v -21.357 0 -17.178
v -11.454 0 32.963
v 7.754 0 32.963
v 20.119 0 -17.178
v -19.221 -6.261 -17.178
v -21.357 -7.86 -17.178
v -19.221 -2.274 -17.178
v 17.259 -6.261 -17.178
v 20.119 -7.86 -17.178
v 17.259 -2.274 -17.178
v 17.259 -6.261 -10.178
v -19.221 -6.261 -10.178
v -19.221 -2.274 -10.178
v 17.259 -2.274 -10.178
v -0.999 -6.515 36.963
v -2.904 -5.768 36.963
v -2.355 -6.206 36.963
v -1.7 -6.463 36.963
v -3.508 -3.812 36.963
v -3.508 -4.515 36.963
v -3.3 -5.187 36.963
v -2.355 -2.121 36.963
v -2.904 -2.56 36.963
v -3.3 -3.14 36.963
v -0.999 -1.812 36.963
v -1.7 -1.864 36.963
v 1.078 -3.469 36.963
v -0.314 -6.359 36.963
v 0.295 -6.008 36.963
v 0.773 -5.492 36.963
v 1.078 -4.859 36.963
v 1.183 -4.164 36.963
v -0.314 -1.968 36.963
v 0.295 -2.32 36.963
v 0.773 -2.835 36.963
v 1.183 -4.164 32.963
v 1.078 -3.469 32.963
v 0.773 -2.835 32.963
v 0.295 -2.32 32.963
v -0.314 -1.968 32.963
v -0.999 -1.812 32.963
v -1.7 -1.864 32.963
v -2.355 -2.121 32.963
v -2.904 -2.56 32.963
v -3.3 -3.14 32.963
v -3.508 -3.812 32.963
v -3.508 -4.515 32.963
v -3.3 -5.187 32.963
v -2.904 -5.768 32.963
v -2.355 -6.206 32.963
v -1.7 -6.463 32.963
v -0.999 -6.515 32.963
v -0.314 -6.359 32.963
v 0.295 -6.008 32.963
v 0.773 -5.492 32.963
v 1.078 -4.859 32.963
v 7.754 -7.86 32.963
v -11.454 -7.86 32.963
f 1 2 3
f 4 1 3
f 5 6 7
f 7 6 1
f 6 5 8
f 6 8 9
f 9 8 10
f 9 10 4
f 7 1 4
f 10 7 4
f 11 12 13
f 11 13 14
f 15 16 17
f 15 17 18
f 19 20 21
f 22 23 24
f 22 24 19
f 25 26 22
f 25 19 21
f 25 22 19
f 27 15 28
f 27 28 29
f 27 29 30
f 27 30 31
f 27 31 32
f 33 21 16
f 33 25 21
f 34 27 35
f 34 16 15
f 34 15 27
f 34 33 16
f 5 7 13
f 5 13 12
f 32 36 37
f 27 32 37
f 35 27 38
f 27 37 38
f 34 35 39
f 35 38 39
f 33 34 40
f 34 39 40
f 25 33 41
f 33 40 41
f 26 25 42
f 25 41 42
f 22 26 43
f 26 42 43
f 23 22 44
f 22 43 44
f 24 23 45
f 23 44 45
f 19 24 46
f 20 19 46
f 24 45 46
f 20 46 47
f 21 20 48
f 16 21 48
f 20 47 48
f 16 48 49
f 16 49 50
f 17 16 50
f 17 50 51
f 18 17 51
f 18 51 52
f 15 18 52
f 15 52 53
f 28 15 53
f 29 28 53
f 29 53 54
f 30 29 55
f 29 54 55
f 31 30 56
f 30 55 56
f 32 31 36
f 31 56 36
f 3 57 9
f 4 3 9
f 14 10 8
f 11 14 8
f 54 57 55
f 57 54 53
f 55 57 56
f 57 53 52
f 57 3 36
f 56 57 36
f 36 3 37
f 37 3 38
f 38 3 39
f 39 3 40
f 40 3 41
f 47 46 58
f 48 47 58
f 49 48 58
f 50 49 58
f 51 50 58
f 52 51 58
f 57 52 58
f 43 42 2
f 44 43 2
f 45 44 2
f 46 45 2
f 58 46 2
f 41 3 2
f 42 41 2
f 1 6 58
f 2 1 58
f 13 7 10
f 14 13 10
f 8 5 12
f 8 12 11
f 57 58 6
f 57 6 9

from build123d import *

# Parameters (mm, degrees)
F1_DEPTH = 7.86
F3_DEPTH = 25.4
F4_R     = 2.35837
F5_DEPTH = 4
F6_W     = 36.480802
F6_H     = 3.986974
F7_DEPTH = 7


with BuildPart() as f1:
    # F0 (on Front) → F1 (new body)
    with BuildSketch(Plane.XZ):
        Polygon((5.895124, 32.963499), (-8.975978, 32.963499), (-21.356635, -17.178163), (20.118568, -17.178163), align=None)
        Polygon((-8.975978, 32.963499), (-21.356635, 32.963499), (-21.356635, -17.178163), align=None)
        Polygon((20.118568, 32.963499), (5.895124, 32.963499), (20.118568, -17.178163), align=None)
    extrude(amount=F1_DEPTH)

    # F2 (on face) → F3 (cut)
    with BuildSketch(Plane.XZ.offset(7.86)):
        Polygon((-21.356635, 32.963499), (-21.356635, -17.178163), (-11.454494, 32.963499), align=None)
        Polygon((7.754011, 32.963499), (20.118568, -17.178163), (20.118568, 32.963499), align=None)
    extrude(amount=-F3_DEPTH, mode=Mode.SUBTRACT)

    # F4 (on face) → F5 (join)
    with BuildSketch(Plane.XY.offset(32.963499)):
        with Locations((-1.175593, -4.163687)):
            Circle(F4_R)
    extrude(amount=F5_DEPTH)

    # F6 (on face) → F7 (cut)
    with BuildSketch(Plane(origin=(0, 0, -17.178163), x_dir=(1, 0, 0), z_dir=(0, 0, -1))):
        with Locations((-0.981017, 4.267381)):
            Rectangle(F6_W, F6_H)
    extrude(amount=-F7_DEPTH, mode=Mode.SUBTRACT)


solid = f1.part
